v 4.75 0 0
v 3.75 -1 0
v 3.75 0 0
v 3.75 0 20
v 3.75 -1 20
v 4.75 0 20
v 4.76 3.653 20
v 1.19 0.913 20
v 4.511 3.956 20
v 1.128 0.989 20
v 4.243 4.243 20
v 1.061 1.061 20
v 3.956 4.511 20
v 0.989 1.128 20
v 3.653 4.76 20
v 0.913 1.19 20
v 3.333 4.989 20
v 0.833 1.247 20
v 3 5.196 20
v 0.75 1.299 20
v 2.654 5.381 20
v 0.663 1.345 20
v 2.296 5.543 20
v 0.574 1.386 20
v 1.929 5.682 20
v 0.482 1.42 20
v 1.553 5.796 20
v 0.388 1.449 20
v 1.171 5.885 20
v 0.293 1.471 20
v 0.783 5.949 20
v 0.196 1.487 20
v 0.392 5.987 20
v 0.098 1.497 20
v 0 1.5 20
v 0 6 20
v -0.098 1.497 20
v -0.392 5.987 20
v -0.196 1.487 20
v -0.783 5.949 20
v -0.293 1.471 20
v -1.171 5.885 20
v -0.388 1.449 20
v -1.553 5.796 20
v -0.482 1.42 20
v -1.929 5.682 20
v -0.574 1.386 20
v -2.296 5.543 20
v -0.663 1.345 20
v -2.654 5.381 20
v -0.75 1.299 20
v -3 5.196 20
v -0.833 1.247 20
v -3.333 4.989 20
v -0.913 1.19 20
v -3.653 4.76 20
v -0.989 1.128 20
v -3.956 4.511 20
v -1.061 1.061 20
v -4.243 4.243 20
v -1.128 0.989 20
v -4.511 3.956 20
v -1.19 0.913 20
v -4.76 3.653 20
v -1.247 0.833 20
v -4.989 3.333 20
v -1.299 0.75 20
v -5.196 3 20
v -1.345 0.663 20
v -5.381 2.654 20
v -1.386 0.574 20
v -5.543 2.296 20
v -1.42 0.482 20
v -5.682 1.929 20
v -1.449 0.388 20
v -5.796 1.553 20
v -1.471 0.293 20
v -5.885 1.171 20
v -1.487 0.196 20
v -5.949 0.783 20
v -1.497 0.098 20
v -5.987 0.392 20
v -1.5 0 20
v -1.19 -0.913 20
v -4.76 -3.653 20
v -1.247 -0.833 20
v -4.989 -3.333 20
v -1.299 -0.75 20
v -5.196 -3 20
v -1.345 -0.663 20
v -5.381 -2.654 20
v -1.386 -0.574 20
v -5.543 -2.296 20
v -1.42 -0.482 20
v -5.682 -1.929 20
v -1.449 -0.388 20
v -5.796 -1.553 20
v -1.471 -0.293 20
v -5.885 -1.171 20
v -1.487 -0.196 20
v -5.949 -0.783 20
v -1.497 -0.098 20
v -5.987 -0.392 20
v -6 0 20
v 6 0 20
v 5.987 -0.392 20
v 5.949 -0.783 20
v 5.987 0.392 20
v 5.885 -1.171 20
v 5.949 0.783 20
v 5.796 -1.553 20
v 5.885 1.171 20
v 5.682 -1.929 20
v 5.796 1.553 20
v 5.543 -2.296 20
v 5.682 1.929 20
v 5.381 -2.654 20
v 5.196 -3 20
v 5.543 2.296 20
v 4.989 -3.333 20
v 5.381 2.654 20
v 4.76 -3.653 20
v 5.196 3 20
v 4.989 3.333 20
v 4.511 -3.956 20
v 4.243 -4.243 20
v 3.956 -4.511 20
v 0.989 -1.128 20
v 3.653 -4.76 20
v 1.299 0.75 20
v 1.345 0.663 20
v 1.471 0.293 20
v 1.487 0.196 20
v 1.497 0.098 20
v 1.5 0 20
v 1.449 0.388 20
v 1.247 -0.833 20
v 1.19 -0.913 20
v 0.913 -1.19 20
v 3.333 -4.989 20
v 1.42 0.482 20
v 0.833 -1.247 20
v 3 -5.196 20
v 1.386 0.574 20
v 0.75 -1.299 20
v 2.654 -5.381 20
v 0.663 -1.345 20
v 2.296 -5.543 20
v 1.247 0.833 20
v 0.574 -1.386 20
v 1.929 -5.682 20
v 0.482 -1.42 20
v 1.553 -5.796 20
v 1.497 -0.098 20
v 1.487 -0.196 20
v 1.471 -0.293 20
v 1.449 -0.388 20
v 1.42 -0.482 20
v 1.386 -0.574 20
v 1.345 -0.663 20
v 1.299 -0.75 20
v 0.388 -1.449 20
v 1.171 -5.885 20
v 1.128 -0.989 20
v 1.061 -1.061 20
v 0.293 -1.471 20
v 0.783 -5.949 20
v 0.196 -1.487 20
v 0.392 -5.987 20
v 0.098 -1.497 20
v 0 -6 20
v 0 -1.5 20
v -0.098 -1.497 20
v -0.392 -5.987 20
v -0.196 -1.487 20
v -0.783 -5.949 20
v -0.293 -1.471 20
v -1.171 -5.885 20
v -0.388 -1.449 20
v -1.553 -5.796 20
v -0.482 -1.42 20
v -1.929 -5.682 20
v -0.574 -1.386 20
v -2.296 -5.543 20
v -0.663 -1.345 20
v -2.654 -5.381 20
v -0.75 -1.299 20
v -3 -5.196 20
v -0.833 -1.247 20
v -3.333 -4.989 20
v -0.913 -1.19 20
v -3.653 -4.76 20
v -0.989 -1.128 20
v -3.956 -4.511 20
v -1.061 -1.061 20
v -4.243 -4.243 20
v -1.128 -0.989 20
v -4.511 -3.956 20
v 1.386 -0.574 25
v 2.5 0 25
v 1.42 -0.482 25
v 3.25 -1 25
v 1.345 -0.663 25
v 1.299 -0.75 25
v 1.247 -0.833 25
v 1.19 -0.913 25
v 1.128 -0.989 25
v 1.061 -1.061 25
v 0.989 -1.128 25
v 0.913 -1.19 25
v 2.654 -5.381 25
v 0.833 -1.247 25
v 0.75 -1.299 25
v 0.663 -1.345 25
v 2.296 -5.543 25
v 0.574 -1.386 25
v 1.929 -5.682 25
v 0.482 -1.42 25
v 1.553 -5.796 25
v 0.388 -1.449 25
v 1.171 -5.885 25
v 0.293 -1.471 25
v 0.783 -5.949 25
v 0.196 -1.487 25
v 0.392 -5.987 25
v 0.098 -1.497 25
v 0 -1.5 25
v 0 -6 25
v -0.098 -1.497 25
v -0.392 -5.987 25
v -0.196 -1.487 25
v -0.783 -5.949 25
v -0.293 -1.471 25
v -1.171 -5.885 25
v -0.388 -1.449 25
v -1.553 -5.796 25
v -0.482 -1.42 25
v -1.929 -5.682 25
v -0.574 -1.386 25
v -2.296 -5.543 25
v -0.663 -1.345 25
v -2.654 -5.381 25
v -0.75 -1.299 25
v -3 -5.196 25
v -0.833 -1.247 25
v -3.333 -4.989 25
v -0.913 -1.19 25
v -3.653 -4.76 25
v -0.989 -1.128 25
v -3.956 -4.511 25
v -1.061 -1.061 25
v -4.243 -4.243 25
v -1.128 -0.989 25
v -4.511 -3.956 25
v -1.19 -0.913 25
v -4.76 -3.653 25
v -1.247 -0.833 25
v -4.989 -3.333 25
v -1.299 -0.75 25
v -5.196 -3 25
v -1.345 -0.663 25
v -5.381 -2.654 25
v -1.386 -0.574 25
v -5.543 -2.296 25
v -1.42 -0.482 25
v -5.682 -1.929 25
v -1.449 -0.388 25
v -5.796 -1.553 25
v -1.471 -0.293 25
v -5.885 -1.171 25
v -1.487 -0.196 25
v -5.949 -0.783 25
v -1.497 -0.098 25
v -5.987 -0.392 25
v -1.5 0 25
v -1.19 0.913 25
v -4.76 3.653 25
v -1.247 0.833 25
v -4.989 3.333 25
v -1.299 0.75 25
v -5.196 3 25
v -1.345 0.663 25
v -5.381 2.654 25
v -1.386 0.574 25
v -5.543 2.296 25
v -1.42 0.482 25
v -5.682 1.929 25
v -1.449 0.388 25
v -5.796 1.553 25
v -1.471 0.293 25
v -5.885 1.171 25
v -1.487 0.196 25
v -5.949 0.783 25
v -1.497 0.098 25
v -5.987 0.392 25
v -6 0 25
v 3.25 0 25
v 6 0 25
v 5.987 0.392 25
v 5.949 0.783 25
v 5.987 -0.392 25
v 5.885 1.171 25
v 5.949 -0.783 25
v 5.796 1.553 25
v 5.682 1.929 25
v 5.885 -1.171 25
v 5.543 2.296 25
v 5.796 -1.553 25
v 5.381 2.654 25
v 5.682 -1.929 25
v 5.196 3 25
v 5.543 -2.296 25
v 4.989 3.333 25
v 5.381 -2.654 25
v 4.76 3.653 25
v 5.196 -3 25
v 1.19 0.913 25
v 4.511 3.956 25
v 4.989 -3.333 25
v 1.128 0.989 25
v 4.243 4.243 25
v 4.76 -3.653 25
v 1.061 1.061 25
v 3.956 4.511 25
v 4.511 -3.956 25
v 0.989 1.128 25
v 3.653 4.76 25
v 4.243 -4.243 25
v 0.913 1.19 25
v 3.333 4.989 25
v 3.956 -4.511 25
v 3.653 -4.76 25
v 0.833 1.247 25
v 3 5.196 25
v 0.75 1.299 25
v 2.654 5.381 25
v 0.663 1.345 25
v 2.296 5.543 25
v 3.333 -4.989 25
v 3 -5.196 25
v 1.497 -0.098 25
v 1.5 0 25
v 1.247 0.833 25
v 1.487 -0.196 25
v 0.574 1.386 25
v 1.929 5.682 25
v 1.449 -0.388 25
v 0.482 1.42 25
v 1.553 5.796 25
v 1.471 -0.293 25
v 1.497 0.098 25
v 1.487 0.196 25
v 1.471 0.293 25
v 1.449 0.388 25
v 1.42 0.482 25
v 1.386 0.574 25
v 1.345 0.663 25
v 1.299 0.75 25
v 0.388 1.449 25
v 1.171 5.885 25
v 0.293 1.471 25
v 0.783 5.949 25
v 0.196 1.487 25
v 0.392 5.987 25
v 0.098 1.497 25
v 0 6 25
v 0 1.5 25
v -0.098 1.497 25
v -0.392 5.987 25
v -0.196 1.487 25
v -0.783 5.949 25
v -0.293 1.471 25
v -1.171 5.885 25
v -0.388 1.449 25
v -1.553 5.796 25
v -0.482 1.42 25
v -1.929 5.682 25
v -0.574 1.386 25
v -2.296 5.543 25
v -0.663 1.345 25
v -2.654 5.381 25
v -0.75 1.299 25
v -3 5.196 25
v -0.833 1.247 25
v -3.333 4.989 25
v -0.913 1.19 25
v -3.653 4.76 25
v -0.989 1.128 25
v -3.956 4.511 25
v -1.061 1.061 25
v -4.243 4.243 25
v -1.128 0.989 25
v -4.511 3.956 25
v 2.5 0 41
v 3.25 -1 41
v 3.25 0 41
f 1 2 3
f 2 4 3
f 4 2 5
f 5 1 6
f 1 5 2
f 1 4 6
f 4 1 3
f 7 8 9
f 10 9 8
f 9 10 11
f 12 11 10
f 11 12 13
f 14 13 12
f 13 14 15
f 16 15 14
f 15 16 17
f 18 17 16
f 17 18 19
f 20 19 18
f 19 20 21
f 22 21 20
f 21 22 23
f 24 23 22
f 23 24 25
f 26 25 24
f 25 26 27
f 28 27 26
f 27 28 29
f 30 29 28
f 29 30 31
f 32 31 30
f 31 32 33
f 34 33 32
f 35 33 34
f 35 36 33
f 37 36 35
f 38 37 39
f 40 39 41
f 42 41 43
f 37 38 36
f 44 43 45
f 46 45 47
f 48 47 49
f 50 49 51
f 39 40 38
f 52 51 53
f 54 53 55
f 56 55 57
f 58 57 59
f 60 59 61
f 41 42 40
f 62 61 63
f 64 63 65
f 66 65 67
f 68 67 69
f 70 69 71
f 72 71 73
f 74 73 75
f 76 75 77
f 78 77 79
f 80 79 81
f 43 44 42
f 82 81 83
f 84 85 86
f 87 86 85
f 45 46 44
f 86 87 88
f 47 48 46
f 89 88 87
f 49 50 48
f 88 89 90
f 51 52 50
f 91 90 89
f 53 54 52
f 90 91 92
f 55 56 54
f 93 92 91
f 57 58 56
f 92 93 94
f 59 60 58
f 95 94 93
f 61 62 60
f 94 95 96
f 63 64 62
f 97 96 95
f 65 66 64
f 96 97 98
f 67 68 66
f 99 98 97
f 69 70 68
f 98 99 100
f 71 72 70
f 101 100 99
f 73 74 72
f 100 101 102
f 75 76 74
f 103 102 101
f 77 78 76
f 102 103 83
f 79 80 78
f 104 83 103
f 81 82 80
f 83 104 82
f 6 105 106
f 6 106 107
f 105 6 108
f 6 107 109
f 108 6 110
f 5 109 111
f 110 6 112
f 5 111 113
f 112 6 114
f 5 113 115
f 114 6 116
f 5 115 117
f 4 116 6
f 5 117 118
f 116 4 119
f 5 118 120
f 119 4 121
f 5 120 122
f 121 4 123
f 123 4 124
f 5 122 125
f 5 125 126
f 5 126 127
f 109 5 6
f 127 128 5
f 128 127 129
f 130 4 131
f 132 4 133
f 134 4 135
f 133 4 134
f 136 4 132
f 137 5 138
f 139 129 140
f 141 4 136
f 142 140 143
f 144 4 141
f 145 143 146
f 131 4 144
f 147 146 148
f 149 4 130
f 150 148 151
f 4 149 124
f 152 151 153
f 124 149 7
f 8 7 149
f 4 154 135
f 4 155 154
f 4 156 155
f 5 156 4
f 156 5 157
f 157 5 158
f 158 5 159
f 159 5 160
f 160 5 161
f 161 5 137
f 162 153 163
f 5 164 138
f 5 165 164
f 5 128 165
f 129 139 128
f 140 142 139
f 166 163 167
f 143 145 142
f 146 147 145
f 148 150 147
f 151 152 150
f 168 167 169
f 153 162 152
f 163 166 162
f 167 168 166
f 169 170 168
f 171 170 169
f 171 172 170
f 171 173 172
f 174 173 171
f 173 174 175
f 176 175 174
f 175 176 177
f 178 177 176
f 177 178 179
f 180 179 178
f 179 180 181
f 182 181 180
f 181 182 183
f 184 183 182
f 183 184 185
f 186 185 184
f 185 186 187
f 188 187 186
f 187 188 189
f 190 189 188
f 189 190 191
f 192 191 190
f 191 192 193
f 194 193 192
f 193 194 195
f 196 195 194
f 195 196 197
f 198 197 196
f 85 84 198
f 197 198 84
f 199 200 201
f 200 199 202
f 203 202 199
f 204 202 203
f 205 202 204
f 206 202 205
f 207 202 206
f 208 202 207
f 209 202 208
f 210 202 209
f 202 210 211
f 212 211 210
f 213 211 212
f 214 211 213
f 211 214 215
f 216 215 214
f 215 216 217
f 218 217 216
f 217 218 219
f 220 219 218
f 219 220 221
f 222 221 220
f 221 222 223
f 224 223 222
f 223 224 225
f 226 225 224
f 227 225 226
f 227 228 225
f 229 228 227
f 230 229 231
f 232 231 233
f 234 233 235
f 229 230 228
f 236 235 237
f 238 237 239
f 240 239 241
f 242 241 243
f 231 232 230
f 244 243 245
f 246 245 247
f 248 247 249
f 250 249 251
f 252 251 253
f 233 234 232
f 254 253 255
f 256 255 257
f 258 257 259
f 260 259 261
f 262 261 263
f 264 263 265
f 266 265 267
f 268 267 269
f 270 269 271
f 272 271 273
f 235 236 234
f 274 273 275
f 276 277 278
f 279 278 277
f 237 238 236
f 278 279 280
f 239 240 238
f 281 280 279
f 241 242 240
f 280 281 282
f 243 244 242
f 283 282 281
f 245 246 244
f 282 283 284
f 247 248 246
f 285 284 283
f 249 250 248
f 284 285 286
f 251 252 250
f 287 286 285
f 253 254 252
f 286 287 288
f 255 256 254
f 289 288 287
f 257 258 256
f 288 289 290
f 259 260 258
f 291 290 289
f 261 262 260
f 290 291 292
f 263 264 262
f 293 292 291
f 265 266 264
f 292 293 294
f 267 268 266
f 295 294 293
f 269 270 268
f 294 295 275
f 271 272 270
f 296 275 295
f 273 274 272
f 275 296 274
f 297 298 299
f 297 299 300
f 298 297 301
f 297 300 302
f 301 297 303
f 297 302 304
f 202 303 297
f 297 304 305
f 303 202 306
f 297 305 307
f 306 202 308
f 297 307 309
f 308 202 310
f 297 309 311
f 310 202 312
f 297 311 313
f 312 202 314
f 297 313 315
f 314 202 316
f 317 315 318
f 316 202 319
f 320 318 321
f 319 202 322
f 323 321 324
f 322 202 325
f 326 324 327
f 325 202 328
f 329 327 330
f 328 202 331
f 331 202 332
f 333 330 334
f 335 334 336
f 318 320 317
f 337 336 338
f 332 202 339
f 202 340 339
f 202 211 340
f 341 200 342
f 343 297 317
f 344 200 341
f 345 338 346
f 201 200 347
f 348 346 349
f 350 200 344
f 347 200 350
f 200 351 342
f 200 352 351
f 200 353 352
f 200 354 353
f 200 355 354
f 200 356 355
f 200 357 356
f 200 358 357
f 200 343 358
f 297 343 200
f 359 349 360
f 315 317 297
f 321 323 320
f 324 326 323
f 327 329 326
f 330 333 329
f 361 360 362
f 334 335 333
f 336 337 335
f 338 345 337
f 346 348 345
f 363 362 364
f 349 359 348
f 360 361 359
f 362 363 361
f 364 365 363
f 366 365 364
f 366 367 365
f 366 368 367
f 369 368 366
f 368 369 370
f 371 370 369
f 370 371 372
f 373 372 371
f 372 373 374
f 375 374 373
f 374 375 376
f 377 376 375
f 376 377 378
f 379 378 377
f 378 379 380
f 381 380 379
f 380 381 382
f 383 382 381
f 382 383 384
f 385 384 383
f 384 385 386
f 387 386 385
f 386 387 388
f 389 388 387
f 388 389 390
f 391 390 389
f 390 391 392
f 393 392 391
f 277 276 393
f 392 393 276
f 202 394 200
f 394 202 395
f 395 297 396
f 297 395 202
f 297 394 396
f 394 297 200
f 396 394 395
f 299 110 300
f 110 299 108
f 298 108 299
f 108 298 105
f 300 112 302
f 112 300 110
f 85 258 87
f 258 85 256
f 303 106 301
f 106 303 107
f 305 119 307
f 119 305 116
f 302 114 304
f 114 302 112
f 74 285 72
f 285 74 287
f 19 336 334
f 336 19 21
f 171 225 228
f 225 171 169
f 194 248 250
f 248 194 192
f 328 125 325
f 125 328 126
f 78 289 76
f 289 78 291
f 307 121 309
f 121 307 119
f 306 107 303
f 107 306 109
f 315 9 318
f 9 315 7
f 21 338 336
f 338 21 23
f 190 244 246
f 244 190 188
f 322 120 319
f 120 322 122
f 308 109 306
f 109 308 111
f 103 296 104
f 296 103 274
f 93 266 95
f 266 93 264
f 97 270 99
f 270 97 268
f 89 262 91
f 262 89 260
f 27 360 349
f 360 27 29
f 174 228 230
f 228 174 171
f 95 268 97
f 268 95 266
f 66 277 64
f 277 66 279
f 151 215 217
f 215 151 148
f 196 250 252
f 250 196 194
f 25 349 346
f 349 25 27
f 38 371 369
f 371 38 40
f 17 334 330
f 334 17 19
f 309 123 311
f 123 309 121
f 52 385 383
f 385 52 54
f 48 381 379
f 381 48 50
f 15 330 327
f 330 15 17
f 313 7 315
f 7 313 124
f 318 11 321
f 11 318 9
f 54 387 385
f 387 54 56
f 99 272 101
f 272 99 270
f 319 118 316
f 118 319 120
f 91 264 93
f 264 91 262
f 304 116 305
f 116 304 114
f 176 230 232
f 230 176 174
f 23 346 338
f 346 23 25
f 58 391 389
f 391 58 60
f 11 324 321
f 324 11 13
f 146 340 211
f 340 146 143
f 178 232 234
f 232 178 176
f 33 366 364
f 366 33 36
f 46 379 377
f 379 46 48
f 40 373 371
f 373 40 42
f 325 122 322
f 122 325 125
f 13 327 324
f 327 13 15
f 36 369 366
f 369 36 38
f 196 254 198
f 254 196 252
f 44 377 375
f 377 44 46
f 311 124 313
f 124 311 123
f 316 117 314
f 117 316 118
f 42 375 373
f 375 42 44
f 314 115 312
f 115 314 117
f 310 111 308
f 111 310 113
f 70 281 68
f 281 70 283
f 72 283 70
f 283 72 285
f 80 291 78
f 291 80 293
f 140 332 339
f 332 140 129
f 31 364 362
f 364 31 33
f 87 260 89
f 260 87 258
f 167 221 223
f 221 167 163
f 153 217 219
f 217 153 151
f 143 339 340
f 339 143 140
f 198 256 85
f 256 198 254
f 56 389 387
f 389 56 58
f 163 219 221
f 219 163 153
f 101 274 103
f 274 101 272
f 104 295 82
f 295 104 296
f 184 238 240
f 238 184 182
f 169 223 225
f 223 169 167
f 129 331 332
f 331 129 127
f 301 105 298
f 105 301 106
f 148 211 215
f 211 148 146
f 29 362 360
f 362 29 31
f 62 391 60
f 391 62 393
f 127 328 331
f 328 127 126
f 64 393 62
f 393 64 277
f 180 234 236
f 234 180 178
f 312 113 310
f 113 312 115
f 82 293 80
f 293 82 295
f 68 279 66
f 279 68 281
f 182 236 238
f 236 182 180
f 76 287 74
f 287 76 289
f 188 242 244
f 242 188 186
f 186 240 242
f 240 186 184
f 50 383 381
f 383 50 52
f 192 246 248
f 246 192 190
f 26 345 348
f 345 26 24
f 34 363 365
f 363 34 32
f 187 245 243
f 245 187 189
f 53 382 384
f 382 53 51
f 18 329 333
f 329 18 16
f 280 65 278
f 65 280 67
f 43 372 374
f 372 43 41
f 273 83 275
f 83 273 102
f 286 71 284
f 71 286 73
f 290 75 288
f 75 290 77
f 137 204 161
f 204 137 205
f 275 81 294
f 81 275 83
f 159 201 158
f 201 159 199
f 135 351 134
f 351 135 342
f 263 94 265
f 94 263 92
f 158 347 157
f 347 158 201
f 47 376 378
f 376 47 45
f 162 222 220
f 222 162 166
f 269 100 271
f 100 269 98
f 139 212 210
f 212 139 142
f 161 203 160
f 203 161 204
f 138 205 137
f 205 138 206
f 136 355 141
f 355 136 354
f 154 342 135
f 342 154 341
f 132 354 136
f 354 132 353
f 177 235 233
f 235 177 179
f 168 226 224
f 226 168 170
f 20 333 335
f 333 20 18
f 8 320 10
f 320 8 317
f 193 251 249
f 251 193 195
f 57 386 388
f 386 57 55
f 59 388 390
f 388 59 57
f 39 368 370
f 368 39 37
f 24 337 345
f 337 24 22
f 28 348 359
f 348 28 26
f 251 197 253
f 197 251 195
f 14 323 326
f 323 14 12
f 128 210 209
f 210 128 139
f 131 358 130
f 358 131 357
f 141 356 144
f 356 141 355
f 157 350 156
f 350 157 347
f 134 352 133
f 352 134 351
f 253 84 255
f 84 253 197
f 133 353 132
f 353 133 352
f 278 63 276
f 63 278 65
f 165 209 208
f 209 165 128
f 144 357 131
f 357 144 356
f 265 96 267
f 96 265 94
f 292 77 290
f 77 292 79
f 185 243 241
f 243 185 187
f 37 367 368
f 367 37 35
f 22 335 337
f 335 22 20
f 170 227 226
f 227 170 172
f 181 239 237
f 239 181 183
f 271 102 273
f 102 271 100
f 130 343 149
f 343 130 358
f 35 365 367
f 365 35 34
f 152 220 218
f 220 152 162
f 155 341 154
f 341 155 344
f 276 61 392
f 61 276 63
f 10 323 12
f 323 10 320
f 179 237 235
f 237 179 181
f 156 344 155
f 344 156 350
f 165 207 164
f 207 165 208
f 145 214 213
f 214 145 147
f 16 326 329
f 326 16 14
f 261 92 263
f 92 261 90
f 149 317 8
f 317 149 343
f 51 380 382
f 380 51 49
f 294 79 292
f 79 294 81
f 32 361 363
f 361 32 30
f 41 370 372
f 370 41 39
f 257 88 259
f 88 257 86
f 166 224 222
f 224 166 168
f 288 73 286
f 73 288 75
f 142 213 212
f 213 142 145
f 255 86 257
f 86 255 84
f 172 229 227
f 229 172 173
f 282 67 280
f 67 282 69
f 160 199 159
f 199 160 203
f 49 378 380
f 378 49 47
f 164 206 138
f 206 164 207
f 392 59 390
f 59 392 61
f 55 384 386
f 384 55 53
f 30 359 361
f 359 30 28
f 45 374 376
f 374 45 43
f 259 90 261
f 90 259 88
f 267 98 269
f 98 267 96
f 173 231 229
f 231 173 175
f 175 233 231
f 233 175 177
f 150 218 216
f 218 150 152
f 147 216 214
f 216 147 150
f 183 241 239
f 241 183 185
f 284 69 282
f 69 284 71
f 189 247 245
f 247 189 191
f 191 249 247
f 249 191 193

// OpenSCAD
// Hose-barb reducer: 8 mm tubing -> 5 mm tubing
// Print orientation: standing upright along +Z

$fn = 96;

// ---- Dimensions (mm) ----
tube_id_8     = 8;    // 8 mm tubing inner diameter
tube_id_5     = 5;    // 5 mm tubing inner diameter
bore          = 3;    // through-bore diameter
collar_d      = 12;   // reducer collar diameter (z = 20..25)

barb_h_8      = 10;   // 8 mm barb height
barb_od_8_b   = 7.5;  // 8 mm barb outer diameter (bottom)
barb_od_8_t   = 9.5;  // 8 mm barb outer diameter (top)

barb_h_5      = 8;    // 5 mm barb height
barb_od_5_b   = 6.5;  // 5 mm barb outer diameter (bottom)
barb_od_5_t   = 5.0;  // 5 mm barb outer diameter (top)

eps           = 0.5;  // cutter overshoot

// ---- Model ----
difference() {
    union() {
        // 8 mm barbs (z = 0..20)
        for (i = [0 : 1])
            translate([0, 0, i * barb_h_8])
                linear_extrude(height = barb_h_8)
                    polygon([
                        [barb_od_8_b / 2, 0],
                        [barb_od_8_t / 2, 0],
                        [barb_od_8_b / 2, -1]
                    ]);

        // Collar (z = 20..25)
        translate([0, 0, 20])
            cylinder(d = collar_d, h = 5);

        // 5 mm barbs (z = 25..41)
        for (i = [0 : 1])
            translate([0, 0, 25 + i * barb_h_5])
                linear_extrude(height = barb_h_5)
                    polygon([
                        [barb_od_5_b / 2, 0],
                        [barb_od_5_t / 2, 0],
                        [barb_od_5_b / 2, -1]
                    ]);
    }

    // Through-bore
    translate([0, 0, -eps])
        cylinder(d = bore, h = 42 + 2 * eps);
}
